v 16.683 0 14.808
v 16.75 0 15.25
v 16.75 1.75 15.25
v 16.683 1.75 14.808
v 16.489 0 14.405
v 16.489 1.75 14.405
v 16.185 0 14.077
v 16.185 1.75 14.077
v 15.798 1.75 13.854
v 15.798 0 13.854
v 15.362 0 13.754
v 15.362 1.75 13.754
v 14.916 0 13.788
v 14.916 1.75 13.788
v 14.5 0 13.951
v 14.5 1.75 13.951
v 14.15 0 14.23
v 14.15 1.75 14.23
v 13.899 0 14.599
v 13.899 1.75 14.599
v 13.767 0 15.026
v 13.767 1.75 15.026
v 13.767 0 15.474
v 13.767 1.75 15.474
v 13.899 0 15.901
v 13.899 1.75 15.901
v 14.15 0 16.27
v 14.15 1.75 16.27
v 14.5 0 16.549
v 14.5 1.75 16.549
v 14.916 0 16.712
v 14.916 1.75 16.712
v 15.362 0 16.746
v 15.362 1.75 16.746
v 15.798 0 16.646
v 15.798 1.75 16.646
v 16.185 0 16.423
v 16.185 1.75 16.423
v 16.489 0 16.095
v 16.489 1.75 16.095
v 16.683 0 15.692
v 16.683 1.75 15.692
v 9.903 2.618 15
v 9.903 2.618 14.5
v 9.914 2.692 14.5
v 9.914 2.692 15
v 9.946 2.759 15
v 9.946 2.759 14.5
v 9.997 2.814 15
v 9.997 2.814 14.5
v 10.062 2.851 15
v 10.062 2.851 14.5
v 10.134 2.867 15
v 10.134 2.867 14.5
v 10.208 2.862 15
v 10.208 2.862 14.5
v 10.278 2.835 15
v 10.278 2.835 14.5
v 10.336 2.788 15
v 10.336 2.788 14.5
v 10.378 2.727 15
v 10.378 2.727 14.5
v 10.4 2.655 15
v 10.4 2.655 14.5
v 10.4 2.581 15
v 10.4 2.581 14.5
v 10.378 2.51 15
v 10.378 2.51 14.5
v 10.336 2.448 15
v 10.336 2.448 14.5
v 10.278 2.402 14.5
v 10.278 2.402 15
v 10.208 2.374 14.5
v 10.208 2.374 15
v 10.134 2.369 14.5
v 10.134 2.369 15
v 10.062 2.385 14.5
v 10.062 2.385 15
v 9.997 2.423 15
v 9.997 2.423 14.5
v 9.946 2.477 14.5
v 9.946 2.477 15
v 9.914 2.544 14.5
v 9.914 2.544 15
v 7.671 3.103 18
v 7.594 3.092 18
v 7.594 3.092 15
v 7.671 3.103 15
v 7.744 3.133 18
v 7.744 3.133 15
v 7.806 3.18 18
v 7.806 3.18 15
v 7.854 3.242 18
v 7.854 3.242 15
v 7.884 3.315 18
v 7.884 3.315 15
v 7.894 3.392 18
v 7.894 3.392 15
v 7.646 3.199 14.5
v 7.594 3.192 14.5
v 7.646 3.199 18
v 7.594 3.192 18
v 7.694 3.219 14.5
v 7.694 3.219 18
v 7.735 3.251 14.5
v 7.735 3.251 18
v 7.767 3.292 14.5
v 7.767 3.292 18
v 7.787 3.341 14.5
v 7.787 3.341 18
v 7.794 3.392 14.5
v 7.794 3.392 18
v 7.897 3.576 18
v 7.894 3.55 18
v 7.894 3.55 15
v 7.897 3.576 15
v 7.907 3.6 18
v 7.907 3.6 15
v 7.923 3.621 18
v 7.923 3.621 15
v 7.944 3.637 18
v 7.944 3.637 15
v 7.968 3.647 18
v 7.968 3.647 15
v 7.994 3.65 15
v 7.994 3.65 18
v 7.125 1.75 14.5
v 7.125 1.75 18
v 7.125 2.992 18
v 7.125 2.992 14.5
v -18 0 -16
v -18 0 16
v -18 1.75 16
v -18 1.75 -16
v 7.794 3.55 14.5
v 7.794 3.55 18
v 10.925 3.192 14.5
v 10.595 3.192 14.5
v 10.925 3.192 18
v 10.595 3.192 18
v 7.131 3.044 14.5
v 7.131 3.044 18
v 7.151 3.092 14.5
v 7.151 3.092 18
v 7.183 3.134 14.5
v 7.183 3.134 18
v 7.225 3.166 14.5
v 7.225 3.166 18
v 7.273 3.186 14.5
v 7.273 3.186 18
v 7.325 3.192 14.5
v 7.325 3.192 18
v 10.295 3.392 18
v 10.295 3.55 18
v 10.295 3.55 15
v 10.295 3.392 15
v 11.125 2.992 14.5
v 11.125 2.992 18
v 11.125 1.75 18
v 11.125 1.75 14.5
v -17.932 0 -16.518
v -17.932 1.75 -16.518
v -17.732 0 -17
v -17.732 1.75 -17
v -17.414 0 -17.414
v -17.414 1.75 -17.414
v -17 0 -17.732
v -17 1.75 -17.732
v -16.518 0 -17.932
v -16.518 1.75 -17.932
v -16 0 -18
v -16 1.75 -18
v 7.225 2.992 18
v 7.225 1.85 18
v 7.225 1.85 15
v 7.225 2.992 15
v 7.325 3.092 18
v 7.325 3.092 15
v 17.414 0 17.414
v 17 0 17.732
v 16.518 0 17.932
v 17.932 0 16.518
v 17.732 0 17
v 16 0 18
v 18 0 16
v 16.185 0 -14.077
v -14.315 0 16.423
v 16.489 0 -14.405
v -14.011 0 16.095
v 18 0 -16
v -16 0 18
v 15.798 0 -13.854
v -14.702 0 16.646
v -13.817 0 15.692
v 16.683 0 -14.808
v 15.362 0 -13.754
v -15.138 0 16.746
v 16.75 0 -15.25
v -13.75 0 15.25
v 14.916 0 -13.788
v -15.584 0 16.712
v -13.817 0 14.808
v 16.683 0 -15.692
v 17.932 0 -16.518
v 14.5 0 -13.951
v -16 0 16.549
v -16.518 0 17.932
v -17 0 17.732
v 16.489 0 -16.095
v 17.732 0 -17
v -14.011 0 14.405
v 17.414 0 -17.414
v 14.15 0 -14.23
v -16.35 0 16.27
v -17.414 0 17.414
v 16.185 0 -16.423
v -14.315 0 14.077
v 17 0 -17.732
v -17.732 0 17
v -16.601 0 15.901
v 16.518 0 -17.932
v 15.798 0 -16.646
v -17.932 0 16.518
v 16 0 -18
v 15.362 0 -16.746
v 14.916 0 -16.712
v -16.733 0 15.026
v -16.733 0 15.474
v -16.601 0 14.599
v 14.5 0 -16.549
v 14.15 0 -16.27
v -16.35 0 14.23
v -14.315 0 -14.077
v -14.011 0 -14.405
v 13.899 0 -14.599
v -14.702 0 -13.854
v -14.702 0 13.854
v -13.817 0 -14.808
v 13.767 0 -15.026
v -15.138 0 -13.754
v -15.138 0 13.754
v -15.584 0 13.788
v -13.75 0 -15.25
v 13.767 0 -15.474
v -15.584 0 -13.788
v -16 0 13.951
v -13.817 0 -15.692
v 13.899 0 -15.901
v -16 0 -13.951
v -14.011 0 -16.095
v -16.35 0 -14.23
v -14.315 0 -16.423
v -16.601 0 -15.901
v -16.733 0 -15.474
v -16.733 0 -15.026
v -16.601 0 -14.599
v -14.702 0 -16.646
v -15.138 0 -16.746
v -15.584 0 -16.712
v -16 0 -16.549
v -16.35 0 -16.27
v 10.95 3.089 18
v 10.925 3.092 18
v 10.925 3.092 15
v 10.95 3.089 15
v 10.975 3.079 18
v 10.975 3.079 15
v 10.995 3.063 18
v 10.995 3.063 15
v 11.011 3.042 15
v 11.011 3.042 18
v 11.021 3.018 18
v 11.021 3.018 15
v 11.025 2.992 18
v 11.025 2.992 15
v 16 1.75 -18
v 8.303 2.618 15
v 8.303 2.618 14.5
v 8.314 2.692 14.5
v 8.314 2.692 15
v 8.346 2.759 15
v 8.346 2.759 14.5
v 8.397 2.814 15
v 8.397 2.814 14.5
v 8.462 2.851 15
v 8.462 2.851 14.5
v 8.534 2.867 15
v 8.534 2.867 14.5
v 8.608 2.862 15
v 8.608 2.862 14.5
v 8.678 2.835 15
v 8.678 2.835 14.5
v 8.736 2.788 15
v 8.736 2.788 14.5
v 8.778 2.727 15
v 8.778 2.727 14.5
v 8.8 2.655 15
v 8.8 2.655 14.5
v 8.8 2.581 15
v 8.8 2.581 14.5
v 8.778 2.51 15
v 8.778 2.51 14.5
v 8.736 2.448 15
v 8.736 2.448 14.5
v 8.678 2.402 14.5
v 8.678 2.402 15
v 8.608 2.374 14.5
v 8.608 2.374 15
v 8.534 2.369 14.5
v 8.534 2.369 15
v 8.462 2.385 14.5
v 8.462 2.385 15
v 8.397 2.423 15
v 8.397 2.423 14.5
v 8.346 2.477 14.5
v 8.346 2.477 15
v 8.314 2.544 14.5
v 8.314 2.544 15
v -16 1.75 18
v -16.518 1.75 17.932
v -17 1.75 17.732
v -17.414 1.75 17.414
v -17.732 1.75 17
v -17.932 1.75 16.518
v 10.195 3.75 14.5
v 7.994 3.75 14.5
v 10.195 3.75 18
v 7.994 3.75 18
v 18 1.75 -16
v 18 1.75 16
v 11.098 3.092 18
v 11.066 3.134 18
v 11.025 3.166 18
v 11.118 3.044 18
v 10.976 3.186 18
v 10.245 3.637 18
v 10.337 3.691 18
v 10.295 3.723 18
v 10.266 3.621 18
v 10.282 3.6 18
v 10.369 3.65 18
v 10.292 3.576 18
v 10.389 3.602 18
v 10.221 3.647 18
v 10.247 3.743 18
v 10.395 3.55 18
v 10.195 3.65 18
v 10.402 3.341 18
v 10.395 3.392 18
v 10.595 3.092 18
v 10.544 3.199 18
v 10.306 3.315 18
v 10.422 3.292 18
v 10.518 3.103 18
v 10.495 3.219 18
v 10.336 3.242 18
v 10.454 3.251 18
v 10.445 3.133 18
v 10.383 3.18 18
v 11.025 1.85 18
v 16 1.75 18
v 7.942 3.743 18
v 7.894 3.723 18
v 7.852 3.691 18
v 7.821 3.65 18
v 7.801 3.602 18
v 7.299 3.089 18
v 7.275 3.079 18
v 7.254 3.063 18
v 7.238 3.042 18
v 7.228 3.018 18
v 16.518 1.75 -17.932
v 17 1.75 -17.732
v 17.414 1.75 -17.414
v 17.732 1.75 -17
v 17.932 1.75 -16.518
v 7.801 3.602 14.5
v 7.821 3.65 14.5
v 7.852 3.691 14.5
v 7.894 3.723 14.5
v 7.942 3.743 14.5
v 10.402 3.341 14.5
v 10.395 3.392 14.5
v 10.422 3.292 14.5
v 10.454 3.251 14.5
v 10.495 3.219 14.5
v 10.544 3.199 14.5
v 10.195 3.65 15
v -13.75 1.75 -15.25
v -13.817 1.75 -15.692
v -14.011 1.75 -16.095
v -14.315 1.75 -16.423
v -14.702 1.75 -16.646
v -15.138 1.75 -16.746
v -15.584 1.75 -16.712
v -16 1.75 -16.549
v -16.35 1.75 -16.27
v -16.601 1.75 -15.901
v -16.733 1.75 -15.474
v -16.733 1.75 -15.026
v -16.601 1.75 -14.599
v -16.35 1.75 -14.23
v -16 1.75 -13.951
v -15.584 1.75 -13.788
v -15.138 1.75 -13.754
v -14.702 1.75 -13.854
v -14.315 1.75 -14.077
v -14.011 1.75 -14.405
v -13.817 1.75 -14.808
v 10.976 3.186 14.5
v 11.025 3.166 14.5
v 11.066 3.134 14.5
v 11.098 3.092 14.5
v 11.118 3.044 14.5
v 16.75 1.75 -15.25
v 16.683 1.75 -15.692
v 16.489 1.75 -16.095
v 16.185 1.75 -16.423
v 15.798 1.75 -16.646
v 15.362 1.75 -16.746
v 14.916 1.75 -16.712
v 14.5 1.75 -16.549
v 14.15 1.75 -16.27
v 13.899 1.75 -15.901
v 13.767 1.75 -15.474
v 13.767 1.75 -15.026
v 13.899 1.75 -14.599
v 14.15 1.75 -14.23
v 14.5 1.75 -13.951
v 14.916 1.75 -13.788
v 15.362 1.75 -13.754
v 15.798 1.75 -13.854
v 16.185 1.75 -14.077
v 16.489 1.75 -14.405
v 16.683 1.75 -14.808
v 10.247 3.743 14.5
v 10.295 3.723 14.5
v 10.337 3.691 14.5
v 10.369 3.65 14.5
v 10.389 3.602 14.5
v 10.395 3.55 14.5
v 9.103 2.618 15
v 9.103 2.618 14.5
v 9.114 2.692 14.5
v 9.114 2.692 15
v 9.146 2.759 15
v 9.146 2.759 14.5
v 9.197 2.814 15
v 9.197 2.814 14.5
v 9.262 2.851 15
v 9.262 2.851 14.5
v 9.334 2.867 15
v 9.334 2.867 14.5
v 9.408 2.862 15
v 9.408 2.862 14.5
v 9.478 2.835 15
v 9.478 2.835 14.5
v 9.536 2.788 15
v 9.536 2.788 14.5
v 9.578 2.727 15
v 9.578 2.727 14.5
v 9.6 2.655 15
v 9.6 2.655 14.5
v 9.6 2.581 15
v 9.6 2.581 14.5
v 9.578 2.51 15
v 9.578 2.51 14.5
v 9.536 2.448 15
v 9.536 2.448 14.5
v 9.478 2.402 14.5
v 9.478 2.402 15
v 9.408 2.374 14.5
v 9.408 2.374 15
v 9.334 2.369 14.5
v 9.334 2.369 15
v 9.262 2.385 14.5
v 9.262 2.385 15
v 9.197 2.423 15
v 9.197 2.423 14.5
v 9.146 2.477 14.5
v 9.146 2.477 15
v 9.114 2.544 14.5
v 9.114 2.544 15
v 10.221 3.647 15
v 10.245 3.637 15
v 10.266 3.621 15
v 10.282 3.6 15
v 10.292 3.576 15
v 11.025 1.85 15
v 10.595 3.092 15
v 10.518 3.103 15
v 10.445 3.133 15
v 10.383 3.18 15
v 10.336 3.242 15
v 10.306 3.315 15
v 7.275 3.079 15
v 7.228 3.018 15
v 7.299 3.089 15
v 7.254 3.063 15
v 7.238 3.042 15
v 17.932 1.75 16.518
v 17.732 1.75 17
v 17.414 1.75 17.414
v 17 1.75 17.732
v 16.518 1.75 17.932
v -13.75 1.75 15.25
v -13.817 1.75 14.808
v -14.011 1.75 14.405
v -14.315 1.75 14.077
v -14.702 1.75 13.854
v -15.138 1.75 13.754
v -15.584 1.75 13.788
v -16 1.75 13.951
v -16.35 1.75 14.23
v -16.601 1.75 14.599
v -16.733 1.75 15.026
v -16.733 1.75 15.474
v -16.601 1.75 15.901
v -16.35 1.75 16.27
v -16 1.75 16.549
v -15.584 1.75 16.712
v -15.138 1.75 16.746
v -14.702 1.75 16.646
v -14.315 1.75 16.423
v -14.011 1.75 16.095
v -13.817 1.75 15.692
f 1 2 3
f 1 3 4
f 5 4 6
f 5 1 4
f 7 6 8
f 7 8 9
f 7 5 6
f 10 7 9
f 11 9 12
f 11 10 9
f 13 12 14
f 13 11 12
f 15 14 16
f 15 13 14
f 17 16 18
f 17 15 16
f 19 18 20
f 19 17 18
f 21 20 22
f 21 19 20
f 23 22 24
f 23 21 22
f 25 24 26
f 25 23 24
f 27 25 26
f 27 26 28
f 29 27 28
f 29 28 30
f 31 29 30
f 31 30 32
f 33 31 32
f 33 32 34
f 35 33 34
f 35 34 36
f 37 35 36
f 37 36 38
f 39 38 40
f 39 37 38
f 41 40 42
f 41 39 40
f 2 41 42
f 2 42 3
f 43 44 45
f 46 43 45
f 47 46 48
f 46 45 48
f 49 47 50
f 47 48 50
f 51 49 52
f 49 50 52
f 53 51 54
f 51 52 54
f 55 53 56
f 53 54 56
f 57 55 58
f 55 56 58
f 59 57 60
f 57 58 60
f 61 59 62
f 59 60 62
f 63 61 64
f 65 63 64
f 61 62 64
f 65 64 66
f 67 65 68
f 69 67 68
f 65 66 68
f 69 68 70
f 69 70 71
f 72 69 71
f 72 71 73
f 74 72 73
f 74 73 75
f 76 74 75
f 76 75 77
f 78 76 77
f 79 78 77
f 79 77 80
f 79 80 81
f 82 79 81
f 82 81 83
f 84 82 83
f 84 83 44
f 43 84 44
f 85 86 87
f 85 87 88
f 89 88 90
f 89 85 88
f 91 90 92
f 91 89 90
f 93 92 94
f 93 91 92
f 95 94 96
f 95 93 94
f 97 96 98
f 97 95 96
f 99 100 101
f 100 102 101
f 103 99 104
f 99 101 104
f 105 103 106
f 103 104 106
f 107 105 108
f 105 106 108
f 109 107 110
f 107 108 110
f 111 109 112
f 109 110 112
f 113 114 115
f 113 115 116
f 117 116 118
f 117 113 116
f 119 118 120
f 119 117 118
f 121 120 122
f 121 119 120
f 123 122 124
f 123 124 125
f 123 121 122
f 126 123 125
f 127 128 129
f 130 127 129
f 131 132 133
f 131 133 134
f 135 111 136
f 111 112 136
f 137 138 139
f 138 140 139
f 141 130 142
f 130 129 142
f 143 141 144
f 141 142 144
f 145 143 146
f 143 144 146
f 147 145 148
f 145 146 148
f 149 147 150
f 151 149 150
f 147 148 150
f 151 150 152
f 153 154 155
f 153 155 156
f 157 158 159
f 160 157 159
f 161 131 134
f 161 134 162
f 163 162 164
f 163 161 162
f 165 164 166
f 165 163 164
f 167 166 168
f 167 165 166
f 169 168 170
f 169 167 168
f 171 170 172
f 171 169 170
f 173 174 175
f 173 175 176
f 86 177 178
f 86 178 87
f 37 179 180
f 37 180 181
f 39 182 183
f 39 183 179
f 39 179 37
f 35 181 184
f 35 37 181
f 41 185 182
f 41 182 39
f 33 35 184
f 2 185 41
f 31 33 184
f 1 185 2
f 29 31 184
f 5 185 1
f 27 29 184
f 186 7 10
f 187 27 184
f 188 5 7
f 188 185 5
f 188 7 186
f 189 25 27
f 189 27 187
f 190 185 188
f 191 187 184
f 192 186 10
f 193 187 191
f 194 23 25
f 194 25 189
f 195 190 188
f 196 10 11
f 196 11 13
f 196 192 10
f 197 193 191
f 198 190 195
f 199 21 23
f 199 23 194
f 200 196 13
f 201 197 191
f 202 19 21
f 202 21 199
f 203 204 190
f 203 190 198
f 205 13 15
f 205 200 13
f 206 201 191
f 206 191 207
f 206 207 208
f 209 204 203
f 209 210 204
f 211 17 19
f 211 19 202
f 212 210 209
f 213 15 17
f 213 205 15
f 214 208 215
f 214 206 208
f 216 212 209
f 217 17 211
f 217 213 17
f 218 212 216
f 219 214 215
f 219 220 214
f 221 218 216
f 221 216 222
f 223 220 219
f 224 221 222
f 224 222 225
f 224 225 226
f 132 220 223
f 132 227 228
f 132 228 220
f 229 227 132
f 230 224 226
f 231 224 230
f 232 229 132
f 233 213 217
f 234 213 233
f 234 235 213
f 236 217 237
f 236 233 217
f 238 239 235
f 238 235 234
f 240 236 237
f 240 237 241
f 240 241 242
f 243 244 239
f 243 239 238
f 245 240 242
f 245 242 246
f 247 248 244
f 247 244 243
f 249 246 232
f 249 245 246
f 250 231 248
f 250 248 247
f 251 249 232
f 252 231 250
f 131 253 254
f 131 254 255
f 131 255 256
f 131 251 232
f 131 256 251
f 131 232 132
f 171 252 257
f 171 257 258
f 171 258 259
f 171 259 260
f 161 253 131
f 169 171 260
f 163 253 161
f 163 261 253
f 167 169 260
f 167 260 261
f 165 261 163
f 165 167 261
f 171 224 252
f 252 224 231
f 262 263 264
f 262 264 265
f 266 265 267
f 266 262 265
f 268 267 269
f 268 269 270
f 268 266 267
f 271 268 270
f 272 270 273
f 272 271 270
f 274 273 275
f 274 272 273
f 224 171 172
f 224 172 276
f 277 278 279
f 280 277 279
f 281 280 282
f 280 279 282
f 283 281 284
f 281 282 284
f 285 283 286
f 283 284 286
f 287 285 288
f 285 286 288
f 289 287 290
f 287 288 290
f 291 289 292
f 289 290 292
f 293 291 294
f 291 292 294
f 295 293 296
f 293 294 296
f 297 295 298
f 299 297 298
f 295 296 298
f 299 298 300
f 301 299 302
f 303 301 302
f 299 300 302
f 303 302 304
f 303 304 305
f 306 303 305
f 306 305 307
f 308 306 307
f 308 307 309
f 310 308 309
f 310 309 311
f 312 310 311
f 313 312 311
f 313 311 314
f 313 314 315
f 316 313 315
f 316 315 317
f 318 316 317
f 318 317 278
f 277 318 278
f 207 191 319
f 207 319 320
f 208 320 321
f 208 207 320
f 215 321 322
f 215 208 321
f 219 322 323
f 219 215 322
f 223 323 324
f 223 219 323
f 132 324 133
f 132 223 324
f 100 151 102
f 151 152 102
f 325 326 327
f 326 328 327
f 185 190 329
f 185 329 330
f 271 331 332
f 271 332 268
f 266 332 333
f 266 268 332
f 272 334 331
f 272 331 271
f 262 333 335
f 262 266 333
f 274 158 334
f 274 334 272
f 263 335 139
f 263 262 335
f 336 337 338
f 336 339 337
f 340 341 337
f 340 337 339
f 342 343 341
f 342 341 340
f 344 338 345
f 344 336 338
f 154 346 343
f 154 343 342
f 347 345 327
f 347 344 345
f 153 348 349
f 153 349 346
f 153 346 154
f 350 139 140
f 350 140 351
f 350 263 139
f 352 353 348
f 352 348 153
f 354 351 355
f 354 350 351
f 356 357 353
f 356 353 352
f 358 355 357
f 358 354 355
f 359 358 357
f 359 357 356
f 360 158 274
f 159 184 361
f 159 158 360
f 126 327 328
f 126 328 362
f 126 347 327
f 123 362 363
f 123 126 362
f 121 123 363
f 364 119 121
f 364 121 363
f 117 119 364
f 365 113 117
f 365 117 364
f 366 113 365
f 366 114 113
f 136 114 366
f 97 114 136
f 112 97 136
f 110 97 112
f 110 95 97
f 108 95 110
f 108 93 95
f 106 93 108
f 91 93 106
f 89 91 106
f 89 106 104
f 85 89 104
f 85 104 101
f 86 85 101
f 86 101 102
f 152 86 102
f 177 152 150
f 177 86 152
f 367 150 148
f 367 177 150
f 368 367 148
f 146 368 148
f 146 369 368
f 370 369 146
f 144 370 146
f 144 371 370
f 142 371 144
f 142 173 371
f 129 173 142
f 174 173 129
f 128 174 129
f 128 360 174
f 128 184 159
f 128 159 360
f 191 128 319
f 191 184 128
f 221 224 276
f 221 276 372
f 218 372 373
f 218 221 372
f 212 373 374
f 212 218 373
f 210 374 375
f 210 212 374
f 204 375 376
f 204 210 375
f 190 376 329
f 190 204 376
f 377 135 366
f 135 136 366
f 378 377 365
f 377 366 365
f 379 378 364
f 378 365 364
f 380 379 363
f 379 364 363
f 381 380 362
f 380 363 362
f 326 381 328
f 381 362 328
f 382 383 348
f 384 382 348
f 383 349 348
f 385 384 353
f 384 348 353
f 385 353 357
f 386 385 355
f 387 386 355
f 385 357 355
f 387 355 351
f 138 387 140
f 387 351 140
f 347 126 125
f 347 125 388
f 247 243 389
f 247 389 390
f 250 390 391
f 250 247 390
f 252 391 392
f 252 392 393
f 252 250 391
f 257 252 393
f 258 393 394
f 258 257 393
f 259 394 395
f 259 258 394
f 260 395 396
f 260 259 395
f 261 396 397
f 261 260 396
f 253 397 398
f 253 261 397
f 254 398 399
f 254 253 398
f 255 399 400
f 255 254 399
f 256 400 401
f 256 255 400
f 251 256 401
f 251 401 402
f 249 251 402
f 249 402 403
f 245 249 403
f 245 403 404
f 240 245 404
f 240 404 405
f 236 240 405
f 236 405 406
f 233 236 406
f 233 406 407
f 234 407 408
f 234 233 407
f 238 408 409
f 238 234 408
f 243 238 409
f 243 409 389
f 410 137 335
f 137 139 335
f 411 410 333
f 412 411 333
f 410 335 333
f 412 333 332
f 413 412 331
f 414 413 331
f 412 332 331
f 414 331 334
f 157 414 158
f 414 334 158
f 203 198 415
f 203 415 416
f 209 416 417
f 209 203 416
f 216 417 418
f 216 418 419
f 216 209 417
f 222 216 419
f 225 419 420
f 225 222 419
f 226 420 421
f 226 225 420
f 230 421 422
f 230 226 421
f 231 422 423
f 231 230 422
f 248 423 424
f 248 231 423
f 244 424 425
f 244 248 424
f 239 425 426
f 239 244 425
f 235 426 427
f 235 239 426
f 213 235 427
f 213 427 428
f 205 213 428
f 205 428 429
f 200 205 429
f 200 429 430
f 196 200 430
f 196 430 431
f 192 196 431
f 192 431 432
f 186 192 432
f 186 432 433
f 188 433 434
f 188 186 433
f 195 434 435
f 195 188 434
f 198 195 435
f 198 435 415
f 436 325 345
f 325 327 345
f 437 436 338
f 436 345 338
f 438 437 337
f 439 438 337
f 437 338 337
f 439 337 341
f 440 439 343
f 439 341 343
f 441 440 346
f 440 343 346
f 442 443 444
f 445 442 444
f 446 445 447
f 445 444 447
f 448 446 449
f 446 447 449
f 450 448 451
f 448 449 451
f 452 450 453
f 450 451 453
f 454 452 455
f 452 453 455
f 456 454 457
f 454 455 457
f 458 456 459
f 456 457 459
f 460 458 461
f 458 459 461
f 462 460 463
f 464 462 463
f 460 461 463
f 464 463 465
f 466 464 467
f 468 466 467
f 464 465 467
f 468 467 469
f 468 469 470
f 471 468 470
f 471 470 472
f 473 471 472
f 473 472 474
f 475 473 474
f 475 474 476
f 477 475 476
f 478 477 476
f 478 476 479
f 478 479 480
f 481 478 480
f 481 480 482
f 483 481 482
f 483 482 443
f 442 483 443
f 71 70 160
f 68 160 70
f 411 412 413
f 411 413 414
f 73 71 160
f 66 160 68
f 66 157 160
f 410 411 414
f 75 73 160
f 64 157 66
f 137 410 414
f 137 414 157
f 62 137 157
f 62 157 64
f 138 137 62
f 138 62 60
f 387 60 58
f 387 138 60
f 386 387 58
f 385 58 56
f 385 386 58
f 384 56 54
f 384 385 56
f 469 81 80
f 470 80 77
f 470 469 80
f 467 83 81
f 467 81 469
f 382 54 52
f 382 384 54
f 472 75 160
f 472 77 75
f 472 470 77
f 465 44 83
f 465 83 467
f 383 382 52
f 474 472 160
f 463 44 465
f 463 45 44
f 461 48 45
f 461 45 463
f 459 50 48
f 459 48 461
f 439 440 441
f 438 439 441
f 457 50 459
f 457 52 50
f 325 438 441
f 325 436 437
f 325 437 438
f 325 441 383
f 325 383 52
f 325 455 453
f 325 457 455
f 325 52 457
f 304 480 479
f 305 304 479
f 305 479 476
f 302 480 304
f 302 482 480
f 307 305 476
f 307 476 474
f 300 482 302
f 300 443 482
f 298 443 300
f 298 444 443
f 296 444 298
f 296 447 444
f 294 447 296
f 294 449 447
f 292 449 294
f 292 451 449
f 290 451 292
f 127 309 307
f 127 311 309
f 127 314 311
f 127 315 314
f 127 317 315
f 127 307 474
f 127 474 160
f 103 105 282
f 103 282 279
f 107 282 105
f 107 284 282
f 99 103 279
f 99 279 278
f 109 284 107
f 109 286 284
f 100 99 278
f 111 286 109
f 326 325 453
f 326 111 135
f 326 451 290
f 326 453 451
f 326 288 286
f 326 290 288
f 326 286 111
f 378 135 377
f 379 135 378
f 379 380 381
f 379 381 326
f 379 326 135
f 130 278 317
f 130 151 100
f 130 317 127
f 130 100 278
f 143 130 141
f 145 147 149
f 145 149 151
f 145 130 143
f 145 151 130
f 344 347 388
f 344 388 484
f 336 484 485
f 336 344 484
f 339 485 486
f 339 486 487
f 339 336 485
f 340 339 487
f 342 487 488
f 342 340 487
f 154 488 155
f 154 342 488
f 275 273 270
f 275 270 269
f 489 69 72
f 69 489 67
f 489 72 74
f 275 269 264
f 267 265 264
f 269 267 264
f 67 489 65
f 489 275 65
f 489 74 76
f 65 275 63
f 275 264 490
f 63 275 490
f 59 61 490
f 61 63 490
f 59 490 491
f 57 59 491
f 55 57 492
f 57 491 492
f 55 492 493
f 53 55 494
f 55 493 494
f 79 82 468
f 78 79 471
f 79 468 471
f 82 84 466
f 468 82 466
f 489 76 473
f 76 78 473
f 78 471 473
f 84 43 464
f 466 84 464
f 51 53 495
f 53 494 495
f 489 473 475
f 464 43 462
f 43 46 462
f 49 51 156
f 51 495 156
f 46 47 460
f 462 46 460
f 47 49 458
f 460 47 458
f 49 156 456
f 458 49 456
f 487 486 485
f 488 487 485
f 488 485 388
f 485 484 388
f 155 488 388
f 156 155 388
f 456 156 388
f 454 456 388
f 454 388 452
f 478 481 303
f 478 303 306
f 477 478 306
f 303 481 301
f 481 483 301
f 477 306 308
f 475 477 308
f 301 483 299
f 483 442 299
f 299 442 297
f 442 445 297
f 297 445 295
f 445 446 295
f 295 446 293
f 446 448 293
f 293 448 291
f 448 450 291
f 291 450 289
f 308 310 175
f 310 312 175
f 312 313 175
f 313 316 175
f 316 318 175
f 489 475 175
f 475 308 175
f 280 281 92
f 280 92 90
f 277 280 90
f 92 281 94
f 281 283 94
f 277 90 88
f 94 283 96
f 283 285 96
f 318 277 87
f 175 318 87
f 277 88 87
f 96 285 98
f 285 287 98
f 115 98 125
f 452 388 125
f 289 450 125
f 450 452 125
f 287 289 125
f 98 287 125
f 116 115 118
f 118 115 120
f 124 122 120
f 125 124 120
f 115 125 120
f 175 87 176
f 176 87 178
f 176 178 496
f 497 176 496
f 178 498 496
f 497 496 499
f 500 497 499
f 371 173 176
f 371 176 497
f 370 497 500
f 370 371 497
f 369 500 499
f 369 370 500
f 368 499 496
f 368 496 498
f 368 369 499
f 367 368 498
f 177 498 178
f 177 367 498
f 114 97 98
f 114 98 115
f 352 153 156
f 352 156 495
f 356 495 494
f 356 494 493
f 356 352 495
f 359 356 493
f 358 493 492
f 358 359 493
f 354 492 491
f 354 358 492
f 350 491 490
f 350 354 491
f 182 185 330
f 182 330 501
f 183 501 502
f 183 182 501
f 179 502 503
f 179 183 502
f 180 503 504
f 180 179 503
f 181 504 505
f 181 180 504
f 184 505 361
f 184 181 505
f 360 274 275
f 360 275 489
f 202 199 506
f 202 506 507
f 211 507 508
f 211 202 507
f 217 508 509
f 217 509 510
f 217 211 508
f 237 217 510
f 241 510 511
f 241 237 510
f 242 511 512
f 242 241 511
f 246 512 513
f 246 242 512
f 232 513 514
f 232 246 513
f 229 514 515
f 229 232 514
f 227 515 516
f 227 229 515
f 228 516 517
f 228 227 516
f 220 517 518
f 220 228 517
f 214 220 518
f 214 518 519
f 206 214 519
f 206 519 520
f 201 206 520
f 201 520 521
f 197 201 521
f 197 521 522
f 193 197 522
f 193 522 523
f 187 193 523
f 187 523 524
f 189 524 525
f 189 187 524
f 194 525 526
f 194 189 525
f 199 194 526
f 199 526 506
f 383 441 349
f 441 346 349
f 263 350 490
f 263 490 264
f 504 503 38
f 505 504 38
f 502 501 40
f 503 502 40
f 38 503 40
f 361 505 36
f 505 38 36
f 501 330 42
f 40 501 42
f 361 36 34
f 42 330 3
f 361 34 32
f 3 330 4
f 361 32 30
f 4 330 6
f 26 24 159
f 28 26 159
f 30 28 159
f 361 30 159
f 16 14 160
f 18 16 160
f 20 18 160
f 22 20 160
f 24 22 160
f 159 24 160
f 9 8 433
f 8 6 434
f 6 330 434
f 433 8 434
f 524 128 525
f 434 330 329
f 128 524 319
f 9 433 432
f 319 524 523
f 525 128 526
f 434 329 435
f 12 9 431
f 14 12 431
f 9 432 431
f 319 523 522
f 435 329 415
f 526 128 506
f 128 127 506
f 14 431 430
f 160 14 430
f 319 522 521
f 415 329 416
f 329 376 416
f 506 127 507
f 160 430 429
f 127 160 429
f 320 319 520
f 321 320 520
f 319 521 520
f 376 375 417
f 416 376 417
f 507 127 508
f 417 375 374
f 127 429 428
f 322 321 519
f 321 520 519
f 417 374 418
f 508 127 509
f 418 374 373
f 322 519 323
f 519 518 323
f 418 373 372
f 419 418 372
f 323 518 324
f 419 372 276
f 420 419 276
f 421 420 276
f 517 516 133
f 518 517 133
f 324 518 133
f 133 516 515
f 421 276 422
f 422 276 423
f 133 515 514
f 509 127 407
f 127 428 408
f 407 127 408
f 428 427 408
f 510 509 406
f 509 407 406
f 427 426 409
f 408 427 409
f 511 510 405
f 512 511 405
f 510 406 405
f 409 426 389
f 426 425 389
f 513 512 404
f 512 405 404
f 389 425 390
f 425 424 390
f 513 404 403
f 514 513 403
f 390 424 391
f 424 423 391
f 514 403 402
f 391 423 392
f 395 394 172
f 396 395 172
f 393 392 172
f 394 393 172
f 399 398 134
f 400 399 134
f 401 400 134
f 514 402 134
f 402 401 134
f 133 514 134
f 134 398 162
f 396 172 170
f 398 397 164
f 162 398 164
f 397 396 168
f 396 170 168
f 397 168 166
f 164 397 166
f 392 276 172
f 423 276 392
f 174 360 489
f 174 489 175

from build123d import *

# Parameters (mm, degrees)
SKETCH2_R           = 1.5
BOSS_EXTRUDE1_DEPTH = 1.75
BOSS_EXTRUDE2_DEPTH = 3
BOSS_EXTRUDE3_DEPTH = 0.5
SKETCH5_R           = 0.25
CUT_EXTRUDE1_DEPTH  = 4.5


with BuildPart() as part:
    # Sketch2 → Boss-Extrude1 (new body)
    with BuildSketch(Plane(origin=(0, 0, 0), x_dir=(1, 0, 0), z_dir=(0, 1, 0))):
        with BuildLine():
            Line((-16, 18), (16, 18))
            ThreePointArc((16, 18), (17.414213562, 17.414213562), (18, 16))
            Line((18, 16), (18, -16))
            ThreePointArc((18, -16), (17.414213562, -17.414213562), (16, -18))
            Line((16, -18), (-16, -18))
            ThreePointArc((-16, -18), (-17.414213562, -17.414213562), (-18, -16))
            Line((-18, -16), (-18, 16))
            ThreePointArc((-18, 16), (-17.414213562, 17.414213562), (-16, 18))
        make_face()
        with Locations((-15.25, 15.25)):
            Circle(SKETCH2_R, mode=Mode.SUBTRACT)
        with Locations((15.25, 15.25)):
            Circle(SKETCH2_R, mode=Mode.SUBTRACT)
        with Locations((15.25, -15.25)):
            Circle(SKETCH2_R, mode=Mode.SUBTRACT)
        with Locations((-15.25, -15.25)):
            Circle(SKETCH2_R, mode=Mode.SUBTRACT)
    extrude(amount=BOSS_EXTRUDE1_DEPTH)

    # Sketch3 → Boss-Extrude2 (add)
    with BuildSketch(Plane.XY.offset(18)):
        with BuildLine():
            Line((7.124530098, 1.75), (11.124530098, 1.75))
            Line((11.124530098, 1.75), (11.124530098, 2.99232659))
            ThreePointArc((11.124530098, 2.99232659), (11.065951454, 3.133747946), (10.924530098, 3.19232659))
            Line((10.924530098, 3.19232659), (10.595445321, 3.19232659))
            ThreePointArc((10.595445321, 3.19232659), (10.454023965, 3.250905233), (10.395445321, 3.39232659))
            Line((10.395445321, 3.39232659), (10.395445321, 3.55))
            ThreePointArc((10.395445321, 3.55), (10.336866677, 3.691421356), (10.195445321, 3.75))
            Line((10.195445321, 3.75), (7.993768929, 3.75))
            ThreePointArc((7.993768929, 3.75), (7.852347573, 3.691421356), (7.793768929, 3.55))
            Line((7.793768929, 3.55), (7.793768929, 3.39232659))
            ThreePointArc((7.793768929, 3.39232659), (7.735190286, 3.250905233), (7.593768929, 3.19232659))
            Line((7.593768929, 3.19232659), (7.324530098, 3.19232659))
            ThreePointArc((7.324530098, 3.19232659), (7.183108742, 3.133747946), (7.124530098, 2.99232659))
            Line((7.124530098, 2.99232659), (7.124530098, 1.75))
        make_face()
        with BuildLine():
            Line((7.993768929, 3.65), (10.195445321, 3.65))
            ThreePointArc((10.195445321, 3.65), (10.266155999, 3.620710678), (10.295445321, 3.55))
            Line((10.295445321, 3.55), (10.295445321, 3.39232659))
            ThreePointArc((10.295445321, 3.39232659), (10.383313287, 3.180194555), (10.595445321, 3.09232659))
            Line((10.595445321, 3.09232659), (10.924530098, 3.09232659))
            ThreePointArc((10.924530098, 3.09232659), (10.995240776, 3.063037268), (11.024530098, 2.99232659))
            Line((11.024530098, 2.99232659), (11.024530098, 1.85))
            Line((11.024530098, 1.85), (7.224530098, 1.85))
            Line((7.224530098, 1.85), (7.224530098, 2.99232659))
            ThreePointArc((7.224530098, 2.99232659), (7.25381942, 3.063037268), (7.324530098, 3.09232659))
            Line((7.324530098, 3.09232659), (7.593768929, 3.09232659))
            ThreePointArc((7.593768929, 3.09232659), (7.805900964, 3.180194555), (7.893768929, 3.39232659))
            Line((7.893768929, 3.39232659), (7.893768929, 3.55))
            ThreePointArc((7.893768929, 3.55), (7.923058251, 3.620710678), (7.993768929, 3.65))
        make_face(mode=Mode.SUBTRACT)
    extrude(amount=-BOSS_EXTRUDE2_DEPTH)

    # Sketch4 → Boss-Extrude3 (add)
    with BuildSketch(Plane(origin=(0, 0, 15), x_dir=(-1, 0, 0), z_dir=(0, 0, -1))):
        with BuildLine():
            Line((-7.124530098, 1.75), (-7.124530098, 2.99232659))
            ThreePointArc((-7.124530098, 2.99232659), (-7.183108742, 3.133747946), (-7.324530098, 3.19232659))
            Line((-7.324530098, 3.19232659), (-7.593768929, 3.19232659))
            ThreePointArc((-7.593768929, 3.19232659), (-7.735190286, 3.250905233), (-7.793768929, 3.39232659))
            Line((-7.793768929, 3.39232659), (-7.793768929, 3.55))
            ThreePointArc((-7.793768929, 3.55), (-7.852347573, 3.691421356), (-7.993768929, 3.75))
            Line((-7.993768929, 3.75), (-10.195445321, 3.75))
            ThreePointArc((-10.195445321, 3.75), (-10.336866677, 3.691421356), (-10.395445321, 3.55))
            Line((-10.395445321, 3.55), (-10.395445321, 3.39232659))
            ThreePointArc((-10.395445321, 3.39232659), (-10.454023965, 3.250905233), (-10.595445321, 3.19232659))
            Line((-10.595445321, 3.19232659), (-10.924530098, 3.19232659))
            ThreePointArc((-10.924530098, 3.19232659), (-11.065951454, 3.133747946), (-11.124530098, 2.99232659))
            Line((-11.124530098, 2.99232659), (-11.124530098, 1.75))
            Line((-11.124530098, 1.75), (-7.124530098, 1.75))
        make_face()
    extrude(amount=BOSS_EXTRUDE3_DEPTH)

    # Sketch5 → Cut-Extrude1 (cut, through all)
    with BuildSketch(Plane(origin=(0, 0, 14.5), x_dir=(-1, 0, 0), z_dir=(0, 0, -1))):
        with Locations((-10.152838139, 2.618092042)):
            Circle(SKETCH5_R)
        with Locations((-9.352838139, 2.618092042)):
            Circle(SKETCH5_R)
        with Locations((-8.552838139, 2.618092042)):
            Circle(SKETCH5_R)
    extrude(amount=-CUT_EXTRUDE1_DEPTH, mode=Mode.SUBTRACT)


solid = part.part
